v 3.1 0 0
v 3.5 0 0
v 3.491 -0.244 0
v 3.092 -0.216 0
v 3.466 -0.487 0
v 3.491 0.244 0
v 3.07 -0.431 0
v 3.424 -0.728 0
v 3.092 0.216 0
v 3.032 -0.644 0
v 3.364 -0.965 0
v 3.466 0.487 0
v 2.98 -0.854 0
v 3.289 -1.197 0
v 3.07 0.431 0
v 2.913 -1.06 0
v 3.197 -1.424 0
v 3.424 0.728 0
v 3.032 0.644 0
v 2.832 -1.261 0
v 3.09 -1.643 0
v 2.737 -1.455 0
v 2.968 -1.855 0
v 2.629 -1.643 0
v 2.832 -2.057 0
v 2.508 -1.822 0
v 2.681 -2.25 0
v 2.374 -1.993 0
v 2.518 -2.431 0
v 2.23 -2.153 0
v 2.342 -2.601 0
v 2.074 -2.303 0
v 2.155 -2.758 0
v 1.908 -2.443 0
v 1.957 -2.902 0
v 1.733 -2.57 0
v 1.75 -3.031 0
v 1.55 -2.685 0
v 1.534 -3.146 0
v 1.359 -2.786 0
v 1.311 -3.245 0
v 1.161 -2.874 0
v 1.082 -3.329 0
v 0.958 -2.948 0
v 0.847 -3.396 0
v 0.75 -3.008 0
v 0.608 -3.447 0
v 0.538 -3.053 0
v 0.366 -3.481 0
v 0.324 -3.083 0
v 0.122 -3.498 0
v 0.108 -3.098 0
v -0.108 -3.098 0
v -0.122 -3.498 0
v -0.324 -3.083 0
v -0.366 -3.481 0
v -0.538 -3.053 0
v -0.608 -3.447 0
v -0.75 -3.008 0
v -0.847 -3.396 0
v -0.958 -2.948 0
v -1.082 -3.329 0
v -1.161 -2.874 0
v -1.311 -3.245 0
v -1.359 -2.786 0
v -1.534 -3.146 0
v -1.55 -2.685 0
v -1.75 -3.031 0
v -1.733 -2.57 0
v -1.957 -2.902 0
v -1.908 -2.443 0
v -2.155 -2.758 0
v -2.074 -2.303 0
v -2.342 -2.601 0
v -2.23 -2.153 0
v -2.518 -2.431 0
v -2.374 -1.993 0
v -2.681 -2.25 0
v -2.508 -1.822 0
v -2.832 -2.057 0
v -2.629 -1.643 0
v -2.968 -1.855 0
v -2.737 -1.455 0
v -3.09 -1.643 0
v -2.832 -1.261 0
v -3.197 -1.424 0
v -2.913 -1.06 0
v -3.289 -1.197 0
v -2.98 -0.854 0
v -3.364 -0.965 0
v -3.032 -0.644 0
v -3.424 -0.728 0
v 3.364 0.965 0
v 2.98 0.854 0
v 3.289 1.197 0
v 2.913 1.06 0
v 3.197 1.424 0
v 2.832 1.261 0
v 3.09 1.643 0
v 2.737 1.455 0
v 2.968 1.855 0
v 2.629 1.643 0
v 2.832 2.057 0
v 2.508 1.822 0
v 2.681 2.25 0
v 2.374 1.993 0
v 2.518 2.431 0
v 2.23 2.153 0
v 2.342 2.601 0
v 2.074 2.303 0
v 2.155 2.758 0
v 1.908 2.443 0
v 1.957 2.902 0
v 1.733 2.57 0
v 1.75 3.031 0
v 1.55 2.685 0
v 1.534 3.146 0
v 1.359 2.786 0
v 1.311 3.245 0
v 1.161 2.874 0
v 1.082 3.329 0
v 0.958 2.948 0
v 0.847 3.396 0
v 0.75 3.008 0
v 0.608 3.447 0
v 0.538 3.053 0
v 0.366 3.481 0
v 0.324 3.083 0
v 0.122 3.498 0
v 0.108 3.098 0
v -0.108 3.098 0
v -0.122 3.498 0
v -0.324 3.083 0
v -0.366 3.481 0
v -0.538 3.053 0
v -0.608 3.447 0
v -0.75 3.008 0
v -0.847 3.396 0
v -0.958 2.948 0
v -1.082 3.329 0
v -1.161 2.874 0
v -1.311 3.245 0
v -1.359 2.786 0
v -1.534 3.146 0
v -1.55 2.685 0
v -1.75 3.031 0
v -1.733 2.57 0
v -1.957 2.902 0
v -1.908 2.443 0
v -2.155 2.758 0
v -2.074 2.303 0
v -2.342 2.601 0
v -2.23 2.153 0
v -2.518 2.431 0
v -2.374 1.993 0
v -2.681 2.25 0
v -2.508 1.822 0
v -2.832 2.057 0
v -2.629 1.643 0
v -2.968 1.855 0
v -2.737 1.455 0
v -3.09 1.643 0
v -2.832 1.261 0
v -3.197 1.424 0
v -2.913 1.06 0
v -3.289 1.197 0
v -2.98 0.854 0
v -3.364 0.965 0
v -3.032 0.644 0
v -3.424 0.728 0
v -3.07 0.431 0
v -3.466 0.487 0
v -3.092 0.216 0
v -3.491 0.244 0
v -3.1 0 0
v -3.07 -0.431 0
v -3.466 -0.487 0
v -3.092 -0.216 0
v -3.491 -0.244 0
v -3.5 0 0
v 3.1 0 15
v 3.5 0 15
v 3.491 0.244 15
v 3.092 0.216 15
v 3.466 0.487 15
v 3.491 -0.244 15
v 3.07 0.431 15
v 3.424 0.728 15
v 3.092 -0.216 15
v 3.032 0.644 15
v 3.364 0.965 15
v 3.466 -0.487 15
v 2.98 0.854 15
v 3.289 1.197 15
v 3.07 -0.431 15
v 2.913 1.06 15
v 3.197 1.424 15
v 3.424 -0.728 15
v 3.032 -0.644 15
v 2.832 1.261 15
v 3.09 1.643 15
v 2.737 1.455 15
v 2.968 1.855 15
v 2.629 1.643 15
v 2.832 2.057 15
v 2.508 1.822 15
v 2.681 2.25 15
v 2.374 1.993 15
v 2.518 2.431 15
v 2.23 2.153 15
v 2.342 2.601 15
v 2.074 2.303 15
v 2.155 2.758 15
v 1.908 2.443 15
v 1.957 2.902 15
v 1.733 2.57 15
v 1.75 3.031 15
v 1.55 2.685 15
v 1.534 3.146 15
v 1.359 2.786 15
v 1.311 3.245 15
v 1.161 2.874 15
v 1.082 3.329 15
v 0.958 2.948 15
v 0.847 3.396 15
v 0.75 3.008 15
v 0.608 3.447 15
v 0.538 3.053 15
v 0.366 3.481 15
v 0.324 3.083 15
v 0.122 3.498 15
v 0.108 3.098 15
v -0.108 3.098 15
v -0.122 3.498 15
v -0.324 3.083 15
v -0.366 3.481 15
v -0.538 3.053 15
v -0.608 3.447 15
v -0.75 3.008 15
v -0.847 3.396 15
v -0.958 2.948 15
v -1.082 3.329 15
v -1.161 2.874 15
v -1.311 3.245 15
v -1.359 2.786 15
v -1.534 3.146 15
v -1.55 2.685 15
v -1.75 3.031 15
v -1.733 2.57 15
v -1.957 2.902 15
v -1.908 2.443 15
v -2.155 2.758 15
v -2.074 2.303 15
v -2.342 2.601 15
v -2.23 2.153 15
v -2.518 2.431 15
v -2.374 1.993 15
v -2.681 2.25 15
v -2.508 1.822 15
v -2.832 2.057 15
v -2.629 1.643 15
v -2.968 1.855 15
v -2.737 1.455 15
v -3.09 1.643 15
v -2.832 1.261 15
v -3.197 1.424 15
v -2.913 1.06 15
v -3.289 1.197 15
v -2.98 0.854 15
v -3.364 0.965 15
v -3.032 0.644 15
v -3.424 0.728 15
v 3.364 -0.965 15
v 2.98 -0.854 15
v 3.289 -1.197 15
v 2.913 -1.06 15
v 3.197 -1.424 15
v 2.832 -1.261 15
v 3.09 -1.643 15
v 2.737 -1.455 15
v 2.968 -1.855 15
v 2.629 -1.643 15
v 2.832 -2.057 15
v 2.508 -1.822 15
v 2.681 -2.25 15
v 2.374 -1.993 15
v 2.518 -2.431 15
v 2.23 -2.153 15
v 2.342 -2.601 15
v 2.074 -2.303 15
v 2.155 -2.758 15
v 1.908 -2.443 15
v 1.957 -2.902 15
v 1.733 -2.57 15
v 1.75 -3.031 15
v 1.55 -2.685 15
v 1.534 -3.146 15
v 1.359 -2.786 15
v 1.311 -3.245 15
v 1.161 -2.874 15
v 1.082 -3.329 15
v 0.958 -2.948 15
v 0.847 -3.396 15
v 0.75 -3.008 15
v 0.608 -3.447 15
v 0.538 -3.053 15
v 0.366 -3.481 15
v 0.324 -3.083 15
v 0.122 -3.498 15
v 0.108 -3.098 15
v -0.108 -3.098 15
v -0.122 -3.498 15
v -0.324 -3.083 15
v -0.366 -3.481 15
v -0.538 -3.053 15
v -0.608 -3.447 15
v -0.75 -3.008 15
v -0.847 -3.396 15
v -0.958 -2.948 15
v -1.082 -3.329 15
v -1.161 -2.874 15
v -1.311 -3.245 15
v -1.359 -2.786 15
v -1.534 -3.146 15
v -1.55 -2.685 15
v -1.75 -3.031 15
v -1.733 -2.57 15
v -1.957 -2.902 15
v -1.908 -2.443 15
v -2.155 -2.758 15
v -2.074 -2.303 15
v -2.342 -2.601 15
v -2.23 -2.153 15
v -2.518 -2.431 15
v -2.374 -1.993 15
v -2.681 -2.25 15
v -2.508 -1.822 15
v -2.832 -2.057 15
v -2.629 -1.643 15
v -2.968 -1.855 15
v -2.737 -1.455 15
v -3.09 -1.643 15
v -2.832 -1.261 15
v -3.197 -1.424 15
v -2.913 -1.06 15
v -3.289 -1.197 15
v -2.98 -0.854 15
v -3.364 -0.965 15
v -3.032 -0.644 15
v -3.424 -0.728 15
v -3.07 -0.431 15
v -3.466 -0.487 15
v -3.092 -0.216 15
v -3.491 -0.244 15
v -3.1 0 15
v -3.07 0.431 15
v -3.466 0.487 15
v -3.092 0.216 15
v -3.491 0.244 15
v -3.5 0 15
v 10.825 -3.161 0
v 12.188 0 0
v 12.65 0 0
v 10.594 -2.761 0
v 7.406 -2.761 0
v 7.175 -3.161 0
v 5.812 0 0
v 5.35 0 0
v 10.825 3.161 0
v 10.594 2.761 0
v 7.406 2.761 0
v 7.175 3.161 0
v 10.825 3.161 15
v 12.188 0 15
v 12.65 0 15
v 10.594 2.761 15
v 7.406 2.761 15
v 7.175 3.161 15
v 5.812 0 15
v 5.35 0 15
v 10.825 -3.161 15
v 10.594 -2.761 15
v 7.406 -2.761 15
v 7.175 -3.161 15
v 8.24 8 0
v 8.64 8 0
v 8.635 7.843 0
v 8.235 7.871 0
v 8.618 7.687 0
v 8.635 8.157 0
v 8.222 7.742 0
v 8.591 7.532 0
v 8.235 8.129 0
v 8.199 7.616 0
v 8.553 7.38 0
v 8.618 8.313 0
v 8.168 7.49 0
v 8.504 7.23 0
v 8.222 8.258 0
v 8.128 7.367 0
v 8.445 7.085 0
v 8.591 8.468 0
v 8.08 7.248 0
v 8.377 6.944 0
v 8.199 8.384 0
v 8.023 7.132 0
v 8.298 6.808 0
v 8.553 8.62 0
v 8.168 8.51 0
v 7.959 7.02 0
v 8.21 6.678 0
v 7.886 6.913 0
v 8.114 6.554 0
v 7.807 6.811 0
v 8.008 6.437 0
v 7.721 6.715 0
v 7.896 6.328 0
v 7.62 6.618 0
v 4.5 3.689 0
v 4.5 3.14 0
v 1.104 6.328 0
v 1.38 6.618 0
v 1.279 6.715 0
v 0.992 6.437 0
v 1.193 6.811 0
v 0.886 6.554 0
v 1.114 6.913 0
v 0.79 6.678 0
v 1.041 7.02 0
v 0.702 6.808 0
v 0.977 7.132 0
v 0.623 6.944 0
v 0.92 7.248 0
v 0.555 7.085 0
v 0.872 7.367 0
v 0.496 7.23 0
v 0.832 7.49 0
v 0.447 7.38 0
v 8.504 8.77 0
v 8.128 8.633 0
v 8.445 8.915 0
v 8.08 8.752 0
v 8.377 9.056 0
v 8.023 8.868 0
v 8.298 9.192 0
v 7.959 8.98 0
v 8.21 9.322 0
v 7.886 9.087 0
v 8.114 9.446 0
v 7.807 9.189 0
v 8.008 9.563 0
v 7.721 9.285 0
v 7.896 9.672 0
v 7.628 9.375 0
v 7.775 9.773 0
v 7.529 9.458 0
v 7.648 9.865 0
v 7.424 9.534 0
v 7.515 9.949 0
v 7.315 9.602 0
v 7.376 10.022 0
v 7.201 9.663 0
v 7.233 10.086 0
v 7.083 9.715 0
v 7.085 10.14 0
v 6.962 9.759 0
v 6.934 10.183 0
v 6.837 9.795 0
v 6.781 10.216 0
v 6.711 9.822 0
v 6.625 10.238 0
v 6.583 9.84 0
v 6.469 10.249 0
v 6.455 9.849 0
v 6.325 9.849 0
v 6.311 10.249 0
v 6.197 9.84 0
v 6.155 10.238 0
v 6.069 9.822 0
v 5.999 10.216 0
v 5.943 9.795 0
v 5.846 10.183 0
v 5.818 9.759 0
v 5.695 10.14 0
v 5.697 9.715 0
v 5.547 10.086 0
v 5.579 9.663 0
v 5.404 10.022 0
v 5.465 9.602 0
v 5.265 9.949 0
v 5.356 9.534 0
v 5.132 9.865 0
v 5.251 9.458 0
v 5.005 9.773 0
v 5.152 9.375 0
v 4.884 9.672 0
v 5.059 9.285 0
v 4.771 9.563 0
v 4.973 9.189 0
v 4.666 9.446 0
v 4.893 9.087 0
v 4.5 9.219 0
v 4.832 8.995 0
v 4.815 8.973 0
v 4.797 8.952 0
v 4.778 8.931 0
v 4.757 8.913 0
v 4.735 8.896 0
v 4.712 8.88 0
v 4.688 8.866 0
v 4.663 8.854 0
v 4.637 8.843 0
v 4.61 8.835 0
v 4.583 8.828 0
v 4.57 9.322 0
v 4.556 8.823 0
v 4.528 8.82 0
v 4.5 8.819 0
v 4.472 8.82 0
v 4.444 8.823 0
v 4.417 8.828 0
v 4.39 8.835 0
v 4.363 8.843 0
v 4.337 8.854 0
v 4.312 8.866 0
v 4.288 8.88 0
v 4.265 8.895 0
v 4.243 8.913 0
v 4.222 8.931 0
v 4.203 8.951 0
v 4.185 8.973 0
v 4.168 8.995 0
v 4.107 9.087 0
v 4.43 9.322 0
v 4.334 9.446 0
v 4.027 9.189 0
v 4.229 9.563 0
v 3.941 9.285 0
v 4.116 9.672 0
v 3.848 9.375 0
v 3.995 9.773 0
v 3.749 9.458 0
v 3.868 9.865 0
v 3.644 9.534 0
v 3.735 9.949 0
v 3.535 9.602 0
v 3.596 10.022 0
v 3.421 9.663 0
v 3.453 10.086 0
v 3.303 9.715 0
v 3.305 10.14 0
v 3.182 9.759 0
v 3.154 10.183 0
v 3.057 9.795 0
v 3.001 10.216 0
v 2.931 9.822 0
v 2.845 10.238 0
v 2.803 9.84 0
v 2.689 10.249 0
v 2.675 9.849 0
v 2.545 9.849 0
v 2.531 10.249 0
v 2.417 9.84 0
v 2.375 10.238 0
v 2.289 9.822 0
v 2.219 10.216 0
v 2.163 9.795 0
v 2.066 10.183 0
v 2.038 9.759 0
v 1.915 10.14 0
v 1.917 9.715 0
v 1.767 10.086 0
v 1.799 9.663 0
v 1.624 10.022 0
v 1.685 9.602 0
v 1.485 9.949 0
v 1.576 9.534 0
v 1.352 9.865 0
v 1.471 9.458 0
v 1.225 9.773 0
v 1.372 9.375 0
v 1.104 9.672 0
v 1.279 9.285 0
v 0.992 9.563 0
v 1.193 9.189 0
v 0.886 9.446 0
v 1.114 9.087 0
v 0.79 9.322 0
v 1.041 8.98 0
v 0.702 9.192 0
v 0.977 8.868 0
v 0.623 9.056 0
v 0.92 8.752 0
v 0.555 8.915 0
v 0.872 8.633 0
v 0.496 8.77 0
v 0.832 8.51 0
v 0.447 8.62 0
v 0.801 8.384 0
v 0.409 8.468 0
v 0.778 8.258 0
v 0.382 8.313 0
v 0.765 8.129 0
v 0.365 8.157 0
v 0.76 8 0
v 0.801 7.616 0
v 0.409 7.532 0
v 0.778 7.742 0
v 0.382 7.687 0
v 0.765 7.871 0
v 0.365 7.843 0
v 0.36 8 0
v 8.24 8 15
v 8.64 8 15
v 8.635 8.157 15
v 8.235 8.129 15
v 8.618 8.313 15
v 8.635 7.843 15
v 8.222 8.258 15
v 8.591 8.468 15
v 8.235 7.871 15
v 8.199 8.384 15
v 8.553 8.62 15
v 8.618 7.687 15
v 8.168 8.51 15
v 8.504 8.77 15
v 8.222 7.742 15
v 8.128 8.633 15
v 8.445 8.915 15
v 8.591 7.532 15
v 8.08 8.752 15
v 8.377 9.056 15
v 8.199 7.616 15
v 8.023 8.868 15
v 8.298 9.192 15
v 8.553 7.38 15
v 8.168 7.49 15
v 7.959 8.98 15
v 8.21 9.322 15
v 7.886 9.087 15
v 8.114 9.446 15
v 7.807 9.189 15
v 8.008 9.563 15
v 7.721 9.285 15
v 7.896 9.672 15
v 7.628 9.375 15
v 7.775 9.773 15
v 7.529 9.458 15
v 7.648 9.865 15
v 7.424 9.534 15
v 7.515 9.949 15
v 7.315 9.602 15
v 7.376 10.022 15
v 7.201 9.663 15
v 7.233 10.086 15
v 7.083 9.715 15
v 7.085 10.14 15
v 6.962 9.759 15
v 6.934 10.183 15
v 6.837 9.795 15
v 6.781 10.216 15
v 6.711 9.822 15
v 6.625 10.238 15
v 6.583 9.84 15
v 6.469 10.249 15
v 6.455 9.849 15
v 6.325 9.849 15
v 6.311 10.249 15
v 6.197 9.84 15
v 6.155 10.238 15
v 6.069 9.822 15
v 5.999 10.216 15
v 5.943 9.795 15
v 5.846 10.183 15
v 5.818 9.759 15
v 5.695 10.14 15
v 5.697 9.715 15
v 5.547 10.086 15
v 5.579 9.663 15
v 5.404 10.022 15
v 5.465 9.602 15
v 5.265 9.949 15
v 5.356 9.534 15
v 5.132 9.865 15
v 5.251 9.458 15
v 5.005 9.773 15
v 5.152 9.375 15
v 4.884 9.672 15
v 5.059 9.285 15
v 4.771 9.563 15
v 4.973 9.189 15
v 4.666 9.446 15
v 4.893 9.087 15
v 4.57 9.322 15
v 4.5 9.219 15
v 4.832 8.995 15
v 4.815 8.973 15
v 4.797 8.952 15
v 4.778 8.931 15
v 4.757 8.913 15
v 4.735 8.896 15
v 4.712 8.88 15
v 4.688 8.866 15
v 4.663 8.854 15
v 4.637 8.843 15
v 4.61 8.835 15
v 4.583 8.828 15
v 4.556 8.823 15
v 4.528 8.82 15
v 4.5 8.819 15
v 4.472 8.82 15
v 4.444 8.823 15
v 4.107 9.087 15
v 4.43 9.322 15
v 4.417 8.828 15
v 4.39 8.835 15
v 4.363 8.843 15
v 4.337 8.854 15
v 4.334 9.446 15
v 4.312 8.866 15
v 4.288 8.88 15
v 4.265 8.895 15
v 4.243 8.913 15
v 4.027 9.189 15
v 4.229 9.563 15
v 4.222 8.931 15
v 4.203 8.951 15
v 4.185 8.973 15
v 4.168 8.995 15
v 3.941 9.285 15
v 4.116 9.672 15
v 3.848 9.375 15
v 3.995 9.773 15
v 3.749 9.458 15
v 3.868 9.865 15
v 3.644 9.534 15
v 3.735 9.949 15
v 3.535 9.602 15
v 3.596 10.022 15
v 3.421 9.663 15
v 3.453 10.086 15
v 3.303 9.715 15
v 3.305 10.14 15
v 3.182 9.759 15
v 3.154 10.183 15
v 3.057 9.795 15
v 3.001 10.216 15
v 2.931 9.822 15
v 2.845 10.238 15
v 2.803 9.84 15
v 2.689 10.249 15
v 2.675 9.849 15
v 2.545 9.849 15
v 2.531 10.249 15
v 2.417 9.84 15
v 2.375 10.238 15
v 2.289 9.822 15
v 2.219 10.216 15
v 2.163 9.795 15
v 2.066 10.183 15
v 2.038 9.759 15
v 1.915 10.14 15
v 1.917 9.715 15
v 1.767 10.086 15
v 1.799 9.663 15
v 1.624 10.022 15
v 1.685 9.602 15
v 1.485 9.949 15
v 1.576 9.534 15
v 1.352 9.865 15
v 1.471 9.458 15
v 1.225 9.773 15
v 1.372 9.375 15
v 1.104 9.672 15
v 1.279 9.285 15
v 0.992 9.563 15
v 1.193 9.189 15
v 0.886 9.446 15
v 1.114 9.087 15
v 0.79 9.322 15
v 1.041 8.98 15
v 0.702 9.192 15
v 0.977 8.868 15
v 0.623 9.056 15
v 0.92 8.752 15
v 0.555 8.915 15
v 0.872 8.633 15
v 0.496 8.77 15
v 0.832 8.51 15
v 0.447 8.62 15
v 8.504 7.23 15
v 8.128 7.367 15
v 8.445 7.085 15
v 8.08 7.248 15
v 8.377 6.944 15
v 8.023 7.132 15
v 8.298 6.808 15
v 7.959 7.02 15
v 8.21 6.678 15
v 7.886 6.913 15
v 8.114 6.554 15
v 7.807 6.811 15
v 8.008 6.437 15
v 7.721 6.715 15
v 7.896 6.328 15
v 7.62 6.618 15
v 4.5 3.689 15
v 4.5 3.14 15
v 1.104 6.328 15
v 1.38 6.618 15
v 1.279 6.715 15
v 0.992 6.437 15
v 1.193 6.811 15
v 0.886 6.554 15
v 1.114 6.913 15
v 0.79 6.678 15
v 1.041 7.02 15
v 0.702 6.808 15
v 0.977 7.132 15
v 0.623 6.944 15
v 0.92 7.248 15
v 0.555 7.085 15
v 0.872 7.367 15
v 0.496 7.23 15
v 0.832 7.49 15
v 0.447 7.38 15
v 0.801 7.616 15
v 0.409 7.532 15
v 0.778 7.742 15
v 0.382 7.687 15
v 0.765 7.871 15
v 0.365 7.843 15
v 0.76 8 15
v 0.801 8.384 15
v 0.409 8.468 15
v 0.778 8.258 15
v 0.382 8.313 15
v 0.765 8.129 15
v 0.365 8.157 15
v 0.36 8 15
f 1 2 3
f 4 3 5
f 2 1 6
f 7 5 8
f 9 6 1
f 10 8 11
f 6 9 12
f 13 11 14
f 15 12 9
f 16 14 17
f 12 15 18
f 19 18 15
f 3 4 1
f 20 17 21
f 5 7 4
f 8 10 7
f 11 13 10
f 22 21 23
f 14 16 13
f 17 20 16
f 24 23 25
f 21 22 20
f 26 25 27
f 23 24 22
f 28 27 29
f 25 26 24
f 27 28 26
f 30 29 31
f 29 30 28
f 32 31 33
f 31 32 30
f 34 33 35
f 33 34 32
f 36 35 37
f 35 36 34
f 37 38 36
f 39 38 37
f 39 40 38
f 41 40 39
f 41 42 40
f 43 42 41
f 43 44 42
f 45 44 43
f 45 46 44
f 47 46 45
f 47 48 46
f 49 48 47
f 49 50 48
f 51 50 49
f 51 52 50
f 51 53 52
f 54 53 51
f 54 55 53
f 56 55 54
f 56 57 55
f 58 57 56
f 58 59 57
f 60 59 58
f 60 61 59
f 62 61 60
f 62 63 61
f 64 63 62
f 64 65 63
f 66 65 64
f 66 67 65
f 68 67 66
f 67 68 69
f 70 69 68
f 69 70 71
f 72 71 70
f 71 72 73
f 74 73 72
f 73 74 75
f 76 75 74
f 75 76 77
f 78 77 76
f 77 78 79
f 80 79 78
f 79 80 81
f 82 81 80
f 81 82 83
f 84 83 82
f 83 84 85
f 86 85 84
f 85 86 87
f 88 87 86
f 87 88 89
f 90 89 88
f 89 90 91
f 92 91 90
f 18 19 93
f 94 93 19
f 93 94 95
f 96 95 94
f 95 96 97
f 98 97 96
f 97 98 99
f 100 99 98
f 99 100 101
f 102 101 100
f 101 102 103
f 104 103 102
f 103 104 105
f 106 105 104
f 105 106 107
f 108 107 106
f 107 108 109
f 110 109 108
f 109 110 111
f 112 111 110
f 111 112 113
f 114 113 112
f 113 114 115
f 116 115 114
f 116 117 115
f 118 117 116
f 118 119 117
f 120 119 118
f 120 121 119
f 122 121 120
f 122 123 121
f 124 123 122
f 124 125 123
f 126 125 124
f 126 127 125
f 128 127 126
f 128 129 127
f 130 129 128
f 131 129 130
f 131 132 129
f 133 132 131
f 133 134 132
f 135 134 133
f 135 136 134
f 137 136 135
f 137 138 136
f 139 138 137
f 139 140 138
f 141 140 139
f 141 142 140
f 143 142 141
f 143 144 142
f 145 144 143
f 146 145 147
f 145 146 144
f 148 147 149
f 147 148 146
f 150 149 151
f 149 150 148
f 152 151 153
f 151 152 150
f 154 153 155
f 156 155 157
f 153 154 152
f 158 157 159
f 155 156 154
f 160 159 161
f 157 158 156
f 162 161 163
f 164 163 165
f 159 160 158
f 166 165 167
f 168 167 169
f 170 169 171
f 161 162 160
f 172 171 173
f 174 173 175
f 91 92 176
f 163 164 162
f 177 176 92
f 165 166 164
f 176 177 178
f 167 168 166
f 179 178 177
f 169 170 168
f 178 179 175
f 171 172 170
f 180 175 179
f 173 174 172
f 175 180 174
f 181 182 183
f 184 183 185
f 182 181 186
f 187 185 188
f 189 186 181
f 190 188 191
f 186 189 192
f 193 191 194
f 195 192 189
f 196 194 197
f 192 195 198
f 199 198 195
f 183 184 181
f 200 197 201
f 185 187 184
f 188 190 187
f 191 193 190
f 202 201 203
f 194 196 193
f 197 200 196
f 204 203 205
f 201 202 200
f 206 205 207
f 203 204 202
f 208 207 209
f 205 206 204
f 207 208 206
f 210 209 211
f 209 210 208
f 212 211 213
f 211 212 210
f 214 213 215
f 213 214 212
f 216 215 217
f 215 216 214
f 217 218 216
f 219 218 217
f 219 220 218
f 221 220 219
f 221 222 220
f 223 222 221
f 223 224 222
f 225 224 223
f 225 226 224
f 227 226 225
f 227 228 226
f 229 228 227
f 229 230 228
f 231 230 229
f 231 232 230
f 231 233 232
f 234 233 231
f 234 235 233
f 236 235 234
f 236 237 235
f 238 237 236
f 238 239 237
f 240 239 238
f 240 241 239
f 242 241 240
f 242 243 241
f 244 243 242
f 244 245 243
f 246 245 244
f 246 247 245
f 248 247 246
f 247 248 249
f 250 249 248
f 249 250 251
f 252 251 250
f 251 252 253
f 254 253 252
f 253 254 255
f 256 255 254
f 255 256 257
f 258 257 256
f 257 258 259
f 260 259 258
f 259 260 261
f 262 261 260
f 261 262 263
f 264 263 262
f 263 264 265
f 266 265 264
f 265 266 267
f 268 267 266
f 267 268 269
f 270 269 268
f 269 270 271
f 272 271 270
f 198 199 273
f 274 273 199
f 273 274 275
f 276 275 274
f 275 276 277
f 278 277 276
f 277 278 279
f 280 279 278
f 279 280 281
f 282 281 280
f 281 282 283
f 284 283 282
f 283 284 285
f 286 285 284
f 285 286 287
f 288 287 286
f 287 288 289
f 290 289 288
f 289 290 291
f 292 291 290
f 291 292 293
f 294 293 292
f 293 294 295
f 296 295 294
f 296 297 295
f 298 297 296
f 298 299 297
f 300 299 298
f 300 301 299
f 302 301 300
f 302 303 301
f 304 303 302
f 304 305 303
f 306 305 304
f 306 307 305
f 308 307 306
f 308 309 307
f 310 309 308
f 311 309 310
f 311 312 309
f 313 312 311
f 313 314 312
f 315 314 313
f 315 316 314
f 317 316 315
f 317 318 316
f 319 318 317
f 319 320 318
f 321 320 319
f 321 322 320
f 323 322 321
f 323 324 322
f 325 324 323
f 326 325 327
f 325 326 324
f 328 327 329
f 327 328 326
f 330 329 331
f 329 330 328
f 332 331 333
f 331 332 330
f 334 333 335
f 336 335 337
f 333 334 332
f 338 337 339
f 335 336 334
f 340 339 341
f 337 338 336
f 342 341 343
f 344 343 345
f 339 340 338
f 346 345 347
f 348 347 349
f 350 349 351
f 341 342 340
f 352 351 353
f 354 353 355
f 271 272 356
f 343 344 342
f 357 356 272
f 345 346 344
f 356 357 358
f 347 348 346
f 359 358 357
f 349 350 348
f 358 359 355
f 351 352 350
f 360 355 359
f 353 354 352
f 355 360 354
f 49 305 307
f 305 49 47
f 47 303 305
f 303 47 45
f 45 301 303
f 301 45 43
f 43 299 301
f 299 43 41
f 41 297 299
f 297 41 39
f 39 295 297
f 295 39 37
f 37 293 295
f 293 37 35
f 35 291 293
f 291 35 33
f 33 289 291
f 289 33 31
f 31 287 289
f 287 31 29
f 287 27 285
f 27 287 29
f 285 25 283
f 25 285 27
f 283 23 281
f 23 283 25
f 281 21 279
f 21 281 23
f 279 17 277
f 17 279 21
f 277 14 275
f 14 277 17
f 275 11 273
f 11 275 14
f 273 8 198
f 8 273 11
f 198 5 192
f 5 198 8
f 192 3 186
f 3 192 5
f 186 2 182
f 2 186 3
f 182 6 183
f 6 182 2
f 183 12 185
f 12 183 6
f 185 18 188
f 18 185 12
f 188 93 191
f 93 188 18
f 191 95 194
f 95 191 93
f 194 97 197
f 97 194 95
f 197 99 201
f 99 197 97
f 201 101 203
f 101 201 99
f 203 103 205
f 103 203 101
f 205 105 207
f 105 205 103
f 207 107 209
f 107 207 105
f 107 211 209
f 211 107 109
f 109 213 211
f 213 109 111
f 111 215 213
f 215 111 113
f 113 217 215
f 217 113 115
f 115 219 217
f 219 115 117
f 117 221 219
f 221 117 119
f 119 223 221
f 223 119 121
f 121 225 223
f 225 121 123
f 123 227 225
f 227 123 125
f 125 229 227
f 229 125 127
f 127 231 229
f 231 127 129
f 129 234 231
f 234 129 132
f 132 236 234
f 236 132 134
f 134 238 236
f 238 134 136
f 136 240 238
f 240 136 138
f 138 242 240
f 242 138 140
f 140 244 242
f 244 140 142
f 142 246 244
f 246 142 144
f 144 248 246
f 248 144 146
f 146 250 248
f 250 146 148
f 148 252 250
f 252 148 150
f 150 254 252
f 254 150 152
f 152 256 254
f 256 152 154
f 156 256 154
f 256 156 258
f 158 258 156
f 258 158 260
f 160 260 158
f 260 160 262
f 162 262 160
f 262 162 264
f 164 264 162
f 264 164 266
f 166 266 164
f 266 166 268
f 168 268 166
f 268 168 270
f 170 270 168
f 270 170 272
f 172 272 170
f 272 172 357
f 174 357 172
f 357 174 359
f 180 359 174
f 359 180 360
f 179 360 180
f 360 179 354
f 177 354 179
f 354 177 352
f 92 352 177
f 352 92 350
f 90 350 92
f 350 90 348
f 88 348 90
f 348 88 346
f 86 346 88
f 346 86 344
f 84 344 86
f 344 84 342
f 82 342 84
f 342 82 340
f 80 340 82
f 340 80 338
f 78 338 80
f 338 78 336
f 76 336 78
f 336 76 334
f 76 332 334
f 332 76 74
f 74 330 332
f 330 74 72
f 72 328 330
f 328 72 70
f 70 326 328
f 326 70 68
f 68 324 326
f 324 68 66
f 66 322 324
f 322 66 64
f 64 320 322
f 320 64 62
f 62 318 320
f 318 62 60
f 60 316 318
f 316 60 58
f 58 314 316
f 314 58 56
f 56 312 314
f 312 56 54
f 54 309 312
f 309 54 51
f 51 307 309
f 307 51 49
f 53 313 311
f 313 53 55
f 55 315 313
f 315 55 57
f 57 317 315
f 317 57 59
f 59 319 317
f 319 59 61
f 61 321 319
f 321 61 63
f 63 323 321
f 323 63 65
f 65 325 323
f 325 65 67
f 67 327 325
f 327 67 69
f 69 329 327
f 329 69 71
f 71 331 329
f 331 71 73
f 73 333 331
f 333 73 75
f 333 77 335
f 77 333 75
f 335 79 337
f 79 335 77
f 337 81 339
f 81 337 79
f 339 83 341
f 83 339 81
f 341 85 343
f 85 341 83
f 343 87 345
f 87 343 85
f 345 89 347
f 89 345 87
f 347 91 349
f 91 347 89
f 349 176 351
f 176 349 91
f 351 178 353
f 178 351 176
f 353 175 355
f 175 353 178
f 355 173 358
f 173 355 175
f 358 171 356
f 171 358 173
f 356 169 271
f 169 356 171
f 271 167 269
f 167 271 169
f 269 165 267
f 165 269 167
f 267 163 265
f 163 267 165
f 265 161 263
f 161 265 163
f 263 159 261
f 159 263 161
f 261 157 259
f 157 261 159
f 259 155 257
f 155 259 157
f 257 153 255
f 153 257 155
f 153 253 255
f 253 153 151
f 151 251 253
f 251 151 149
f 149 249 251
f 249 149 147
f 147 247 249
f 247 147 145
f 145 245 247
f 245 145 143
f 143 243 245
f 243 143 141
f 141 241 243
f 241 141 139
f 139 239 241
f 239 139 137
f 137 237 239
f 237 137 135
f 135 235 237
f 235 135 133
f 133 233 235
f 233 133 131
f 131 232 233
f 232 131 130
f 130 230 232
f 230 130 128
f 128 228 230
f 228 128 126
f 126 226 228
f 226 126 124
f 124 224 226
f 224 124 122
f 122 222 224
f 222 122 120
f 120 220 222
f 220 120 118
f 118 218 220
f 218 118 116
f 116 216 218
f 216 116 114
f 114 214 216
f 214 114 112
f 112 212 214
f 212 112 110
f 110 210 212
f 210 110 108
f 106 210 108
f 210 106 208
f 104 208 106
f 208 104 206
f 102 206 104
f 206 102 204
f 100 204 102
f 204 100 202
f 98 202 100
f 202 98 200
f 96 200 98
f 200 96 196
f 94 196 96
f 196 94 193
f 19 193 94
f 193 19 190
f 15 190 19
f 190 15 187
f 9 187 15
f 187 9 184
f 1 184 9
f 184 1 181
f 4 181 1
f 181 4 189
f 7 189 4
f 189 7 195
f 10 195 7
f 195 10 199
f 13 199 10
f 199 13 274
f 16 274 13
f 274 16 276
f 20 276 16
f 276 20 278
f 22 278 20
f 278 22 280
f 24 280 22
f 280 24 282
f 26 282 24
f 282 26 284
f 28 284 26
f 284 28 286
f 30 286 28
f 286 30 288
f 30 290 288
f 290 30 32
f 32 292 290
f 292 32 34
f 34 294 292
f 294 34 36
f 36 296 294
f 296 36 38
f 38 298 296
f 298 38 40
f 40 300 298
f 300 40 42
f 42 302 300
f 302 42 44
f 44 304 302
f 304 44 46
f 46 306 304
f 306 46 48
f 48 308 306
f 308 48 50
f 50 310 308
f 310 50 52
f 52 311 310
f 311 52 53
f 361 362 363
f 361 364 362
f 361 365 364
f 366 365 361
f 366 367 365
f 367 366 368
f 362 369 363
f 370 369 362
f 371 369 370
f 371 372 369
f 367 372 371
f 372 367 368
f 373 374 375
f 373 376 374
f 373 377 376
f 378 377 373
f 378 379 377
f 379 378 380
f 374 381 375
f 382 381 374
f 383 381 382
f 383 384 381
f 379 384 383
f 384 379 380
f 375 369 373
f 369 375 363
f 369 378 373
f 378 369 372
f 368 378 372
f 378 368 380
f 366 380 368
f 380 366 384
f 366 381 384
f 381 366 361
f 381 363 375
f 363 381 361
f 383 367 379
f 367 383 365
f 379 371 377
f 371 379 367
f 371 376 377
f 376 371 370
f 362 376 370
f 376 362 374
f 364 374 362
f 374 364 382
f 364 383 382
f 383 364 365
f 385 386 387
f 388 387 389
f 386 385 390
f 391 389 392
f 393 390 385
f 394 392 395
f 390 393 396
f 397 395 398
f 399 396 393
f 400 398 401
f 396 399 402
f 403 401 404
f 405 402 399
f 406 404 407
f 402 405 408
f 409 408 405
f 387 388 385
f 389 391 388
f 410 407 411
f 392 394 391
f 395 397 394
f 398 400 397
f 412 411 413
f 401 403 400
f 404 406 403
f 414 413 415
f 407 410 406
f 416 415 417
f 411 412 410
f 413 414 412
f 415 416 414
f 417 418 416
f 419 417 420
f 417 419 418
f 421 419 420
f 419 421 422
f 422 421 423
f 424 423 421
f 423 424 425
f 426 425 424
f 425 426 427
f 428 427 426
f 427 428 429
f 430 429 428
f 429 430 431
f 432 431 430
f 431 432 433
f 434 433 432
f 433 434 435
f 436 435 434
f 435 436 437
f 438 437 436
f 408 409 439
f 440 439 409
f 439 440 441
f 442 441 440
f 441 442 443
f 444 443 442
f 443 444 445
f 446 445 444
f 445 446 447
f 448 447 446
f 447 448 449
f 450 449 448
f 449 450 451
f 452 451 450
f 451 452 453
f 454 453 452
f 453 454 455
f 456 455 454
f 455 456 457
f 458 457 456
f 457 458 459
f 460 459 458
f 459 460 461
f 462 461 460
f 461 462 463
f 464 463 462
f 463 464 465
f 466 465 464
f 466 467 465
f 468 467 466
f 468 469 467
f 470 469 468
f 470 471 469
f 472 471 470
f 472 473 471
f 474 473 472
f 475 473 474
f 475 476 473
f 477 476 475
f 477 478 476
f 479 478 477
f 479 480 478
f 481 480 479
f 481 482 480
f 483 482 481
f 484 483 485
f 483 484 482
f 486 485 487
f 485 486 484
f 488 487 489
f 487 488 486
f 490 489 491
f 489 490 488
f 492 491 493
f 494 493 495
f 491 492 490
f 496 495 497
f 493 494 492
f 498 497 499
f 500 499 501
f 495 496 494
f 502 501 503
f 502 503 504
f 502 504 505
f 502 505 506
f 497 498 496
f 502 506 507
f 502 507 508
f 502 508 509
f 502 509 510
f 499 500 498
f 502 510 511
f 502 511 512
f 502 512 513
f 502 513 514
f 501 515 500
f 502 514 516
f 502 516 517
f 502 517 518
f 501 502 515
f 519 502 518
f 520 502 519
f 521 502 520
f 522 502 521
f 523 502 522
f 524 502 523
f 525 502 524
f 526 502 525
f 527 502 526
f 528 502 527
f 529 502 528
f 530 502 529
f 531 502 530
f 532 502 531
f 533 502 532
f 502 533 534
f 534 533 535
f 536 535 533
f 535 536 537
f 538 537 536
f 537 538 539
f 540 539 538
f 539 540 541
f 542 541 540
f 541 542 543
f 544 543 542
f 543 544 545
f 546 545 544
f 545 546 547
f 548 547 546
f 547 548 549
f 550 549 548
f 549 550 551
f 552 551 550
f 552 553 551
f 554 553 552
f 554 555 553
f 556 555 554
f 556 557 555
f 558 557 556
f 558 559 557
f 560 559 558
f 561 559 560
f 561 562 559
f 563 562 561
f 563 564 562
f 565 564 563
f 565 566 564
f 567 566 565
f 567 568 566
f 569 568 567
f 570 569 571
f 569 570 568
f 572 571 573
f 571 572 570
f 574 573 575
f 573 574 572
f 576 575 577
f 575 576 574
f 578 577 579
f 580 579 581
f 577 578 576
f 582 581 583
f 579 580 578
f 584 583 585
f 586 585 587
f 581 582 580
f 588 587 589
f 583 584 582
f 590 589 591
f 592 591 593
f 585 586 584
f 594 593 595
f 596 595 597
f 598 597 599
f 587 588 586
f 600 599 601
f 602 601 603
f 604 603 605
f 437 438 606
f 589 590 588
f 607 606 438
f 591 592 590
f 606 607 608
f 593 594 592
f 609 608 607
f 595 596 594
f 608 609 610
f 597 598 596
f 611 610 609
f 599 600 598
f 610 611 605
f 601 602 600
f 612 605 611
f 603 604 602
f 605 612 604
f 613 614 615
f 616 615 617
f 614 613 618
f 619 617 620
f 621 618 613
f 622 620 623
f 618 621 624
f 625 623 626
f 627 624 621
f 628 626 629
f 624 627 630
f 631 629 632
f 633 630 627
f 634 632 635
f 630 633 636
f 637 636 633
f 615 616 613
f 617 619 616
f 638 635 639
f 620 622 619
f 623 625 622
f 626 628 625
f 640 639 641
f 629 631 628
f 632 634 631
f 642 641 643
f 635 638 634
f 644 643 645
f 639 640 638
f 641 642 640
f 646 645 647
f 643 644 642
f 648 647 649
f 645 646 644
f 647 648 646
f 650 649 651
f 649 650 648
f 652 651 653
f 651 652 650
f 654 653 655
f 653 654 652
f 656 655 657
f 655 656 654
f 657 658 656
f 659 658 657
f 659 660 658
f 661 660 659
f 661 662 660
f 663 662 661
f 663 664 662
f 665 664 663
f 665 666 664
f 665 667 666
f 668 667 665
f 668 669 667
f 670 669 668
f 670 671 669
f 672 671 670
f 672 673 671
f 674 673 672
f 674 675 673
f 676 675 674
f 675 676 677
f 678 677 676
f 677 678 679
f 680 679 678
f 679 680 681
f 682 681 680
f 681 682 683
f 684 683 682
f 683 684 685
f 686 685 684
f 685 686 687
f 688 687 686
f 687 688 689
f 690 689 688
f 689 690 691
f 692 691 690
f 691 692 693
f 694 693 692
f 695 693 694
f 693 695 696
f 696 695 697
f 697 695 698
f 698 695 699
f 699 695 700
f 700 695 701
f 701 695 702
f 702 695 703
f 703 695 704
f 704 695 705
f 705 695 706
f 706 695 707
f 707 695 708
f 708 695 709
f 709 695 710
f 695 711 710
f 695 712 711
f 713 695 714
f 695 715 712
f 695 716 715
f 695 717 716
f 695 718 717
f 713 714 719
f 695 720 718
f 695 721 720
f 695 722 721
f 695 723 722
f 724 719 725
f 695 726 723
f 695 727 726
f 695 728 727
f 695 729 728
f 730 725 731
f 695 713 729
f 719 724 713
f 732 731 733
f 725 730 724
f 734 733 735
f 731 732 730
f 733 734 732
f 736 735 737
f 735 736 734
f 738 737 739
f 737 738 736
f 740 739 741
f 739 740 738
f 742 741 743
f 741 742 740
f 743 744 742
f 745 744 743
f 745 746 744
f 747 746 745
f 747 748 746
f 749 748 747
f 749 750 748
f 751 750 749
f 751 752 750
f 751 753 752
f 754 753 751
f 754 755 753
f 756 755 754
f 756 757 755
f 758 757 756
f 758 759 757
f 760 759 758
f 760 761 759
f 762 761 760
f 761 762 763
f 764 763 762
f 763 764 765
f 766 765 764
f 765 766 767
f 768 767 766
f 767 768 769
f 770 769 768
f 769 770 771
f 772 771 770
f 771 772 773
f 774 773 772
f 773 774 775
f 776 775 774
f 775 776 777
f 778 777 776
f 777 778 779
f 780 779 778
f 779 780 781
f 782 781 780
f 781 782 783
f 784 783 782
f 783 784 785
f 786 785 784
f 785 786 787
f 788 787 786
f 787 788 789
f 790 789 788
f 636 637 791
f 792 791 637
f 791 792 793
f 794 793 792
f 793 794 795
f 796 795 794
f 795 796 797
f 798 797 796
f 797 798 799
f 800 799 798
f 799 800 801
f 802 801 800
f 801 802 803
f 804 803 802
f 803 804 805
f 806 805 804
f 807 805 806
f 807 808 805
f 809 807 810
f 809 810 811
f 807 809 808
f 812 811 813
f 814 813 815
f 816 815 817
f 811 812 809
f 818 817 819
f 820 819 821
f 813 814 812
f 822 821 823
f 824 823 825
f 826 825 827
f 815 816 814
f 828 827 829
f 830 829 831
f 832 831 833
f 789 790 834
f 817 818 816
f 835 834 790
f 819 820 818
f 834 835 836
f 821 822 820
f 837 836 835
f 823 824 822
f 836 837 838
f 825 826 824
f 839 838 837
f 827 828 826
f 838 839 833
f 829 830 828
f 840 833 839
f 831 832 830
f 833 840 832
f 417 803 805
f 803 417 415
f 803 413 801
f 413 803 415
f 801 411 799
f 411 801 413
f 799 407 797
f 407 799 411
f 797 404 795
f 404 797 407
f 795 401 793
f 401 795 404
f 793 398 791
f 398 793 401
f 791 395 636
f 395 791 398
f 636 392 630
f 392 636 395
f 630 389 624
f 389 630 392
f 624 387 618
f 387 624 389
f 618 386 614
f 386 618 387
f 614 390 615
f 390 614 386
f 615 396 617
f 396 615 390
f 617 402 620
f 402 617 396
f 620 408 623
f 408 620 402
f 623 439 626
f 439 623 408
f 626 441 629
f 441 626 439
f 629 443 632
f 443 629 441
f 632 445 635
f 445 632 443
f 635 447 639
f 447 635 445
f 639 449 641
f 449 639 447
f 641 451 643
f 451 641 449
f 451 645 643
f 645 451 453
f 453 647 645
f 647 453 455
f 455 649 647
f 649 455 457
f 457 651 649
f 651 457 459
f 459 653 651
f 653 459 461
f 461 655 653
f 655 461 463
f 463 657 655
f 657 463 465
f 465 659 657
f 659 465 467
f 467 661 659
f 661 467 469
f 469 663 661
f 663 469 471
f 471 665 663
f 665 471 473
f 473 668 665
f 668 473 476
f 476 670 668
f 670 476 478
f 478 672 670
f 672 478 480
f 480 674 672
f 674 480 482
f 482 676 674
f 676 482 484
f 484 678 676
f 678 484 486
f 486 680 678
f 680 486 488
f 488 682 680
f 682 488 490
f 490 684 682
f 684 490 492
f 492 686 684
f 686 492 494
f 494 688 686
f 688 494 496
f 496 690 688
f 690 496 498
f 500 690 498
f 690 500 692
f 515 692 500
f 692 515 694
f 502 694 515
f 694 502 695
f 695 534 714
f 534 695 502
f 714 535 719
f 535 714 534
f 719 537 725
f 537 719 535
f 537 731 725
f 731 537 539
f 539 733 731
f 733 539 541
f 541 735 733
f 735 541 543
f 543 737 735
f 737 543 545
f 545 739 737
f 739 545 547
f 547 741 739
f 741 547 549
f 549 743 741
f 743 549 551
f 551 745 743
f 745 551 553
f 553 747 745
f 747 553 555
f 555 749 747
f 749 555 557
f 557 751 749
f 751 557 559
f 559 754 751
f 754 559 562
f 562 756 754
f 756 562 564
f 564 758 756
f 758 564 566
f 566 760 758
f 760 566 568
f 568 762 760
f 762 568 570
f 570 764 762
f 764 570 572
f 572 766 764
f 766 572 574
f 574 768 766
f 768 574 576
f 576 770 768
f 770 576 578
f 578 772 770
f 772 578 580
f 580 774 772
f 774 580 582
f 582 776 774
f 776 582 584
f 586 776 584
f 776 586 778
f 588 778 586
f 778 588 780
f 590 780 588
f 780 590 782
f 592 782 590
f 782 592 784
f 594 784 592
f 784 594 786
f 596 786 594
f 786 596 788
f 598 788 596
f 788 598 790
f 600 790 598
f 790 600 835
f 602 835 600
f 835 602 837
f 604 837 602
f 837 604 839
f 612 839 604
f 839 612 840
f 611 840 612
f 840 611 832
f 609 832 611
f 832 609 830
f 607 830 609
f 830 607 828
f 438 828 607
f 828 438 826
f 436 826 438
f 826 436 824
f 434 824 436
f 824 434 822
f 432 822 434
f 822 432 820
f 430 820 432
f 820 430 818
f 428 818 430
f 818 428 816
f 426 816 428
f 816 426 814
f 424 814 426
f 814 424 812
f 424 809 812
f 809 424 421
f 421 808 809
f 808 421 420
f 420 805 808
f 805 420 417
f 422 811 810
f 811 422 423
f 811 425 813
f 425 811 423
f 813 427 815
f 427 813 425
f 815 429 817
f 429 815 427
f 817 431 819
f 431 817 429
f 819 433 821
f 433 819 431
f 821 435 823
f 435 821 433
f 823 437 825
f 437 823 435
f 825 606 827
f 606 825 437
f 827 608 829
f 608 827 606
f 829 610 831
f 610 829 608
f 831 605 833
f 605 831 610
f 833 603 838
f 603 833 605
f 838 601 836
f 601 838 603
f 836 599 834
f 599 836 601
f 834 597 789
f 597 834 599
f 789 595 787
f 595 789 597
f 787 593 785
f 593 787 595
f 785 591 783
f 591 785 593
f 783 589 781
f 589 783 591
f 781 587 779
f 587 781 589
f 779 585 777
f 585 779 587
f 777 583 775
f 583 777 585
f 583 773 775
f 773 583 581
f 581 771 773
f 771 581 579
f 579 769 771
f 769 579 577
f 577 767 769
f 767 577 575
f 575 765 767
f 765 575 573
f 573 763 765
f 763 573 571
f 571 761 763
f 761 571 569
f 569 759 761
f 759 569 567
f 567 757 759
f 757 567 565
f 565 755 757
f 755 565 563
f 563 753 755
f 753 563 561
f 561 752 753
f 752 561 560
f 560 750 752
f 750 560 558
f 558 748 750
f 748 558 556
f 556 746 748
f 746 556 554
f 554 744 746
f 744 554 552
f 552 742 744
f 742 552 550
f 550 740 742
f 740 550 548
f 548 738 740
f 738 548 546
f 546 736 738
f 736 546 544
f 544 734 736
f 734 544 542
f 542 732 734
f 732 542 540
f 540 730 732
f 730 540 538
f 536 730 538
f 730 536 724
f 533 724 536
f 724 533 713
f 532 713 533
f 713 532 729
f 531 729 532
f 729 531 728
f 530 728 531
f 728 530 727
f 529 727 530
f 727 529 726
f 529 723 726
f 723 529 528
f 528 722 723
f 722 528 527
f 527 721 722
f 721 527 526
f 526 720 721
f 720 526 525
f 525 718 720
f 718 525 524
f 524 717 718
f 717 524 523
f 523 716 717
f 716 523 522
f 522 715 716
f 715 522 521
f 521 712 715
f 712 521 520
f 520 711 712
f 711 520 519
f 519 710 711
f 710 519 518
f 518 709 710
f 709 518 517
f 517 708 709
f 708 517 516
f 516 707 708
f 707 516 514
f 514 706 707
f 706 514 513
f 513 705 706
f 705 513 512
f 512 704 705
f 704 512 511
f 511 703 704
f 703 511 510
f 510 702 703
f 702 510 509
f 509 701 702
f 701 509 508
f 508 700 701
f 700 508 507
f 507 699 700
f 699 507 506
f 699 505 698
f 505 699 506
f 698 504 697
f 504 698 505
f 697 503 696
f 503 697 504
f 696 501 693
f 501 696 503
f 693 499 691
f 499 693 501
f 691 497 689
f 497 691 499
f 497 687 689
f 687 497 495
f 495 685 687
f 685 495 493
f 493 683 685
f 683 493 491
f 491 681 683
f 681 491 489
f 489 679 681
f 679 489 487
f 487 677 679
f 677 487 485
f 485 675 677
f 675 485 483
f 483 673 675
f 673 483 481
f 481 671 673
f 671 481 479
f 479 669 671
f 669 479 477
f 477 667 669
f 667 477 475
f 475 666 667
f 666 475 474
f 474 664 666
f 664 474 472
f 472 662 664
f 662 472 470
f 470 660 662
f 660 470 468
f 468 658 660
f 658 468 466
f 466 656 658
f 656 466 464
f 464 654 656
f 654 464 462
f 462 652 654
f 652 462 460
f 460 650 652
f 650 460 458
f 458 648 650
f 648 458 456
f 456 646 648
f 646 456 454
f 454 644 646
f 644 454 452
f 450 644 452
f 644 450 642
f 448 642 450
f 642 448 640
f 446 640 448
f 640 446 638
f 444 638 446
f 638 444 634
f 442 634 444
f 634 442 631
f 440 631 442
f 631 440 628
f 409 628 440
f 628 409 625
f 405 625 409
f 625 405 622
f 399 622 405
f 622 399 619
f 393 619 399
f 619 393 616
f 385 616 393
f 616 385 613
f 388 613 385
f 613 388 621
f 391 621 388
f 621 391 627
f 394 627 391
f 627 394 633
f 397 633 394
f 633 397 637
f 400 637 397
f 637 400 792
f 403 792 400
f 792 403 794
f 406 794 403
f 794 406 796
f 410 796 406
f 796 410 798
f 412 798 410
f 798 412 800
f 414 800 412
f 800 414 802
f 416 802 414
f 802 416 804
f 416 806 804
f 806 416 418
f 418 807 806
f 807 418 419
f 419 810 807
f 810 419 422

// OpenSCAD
length = 15;
wall = 0.4;
$fn = 90;

module straw() {
  linear_extrude(length) {
    difference() {
      children();
      offset(-wall) children();
    }
  }
}

module heart_top() {
  for (a = [-1, 1])
    scale([a, 1])
      translate([2.1, 0]) circle(d=5);
}

module heart() {
  scale([1, 1] * 0.9) {
    heart_top();
    hull() {
      intersection() {
        heart_top();
        translate([0, -50]) square(100, center=true);
      }
      translate([0, -5.4]) square(0.00001);
    }
  }
}

straw() circle(d=7);
translate([9, 0, 0]) straw() circle(d=7.3, $fn=6);
translate([4.5, 8, 0]) straw() heart();
